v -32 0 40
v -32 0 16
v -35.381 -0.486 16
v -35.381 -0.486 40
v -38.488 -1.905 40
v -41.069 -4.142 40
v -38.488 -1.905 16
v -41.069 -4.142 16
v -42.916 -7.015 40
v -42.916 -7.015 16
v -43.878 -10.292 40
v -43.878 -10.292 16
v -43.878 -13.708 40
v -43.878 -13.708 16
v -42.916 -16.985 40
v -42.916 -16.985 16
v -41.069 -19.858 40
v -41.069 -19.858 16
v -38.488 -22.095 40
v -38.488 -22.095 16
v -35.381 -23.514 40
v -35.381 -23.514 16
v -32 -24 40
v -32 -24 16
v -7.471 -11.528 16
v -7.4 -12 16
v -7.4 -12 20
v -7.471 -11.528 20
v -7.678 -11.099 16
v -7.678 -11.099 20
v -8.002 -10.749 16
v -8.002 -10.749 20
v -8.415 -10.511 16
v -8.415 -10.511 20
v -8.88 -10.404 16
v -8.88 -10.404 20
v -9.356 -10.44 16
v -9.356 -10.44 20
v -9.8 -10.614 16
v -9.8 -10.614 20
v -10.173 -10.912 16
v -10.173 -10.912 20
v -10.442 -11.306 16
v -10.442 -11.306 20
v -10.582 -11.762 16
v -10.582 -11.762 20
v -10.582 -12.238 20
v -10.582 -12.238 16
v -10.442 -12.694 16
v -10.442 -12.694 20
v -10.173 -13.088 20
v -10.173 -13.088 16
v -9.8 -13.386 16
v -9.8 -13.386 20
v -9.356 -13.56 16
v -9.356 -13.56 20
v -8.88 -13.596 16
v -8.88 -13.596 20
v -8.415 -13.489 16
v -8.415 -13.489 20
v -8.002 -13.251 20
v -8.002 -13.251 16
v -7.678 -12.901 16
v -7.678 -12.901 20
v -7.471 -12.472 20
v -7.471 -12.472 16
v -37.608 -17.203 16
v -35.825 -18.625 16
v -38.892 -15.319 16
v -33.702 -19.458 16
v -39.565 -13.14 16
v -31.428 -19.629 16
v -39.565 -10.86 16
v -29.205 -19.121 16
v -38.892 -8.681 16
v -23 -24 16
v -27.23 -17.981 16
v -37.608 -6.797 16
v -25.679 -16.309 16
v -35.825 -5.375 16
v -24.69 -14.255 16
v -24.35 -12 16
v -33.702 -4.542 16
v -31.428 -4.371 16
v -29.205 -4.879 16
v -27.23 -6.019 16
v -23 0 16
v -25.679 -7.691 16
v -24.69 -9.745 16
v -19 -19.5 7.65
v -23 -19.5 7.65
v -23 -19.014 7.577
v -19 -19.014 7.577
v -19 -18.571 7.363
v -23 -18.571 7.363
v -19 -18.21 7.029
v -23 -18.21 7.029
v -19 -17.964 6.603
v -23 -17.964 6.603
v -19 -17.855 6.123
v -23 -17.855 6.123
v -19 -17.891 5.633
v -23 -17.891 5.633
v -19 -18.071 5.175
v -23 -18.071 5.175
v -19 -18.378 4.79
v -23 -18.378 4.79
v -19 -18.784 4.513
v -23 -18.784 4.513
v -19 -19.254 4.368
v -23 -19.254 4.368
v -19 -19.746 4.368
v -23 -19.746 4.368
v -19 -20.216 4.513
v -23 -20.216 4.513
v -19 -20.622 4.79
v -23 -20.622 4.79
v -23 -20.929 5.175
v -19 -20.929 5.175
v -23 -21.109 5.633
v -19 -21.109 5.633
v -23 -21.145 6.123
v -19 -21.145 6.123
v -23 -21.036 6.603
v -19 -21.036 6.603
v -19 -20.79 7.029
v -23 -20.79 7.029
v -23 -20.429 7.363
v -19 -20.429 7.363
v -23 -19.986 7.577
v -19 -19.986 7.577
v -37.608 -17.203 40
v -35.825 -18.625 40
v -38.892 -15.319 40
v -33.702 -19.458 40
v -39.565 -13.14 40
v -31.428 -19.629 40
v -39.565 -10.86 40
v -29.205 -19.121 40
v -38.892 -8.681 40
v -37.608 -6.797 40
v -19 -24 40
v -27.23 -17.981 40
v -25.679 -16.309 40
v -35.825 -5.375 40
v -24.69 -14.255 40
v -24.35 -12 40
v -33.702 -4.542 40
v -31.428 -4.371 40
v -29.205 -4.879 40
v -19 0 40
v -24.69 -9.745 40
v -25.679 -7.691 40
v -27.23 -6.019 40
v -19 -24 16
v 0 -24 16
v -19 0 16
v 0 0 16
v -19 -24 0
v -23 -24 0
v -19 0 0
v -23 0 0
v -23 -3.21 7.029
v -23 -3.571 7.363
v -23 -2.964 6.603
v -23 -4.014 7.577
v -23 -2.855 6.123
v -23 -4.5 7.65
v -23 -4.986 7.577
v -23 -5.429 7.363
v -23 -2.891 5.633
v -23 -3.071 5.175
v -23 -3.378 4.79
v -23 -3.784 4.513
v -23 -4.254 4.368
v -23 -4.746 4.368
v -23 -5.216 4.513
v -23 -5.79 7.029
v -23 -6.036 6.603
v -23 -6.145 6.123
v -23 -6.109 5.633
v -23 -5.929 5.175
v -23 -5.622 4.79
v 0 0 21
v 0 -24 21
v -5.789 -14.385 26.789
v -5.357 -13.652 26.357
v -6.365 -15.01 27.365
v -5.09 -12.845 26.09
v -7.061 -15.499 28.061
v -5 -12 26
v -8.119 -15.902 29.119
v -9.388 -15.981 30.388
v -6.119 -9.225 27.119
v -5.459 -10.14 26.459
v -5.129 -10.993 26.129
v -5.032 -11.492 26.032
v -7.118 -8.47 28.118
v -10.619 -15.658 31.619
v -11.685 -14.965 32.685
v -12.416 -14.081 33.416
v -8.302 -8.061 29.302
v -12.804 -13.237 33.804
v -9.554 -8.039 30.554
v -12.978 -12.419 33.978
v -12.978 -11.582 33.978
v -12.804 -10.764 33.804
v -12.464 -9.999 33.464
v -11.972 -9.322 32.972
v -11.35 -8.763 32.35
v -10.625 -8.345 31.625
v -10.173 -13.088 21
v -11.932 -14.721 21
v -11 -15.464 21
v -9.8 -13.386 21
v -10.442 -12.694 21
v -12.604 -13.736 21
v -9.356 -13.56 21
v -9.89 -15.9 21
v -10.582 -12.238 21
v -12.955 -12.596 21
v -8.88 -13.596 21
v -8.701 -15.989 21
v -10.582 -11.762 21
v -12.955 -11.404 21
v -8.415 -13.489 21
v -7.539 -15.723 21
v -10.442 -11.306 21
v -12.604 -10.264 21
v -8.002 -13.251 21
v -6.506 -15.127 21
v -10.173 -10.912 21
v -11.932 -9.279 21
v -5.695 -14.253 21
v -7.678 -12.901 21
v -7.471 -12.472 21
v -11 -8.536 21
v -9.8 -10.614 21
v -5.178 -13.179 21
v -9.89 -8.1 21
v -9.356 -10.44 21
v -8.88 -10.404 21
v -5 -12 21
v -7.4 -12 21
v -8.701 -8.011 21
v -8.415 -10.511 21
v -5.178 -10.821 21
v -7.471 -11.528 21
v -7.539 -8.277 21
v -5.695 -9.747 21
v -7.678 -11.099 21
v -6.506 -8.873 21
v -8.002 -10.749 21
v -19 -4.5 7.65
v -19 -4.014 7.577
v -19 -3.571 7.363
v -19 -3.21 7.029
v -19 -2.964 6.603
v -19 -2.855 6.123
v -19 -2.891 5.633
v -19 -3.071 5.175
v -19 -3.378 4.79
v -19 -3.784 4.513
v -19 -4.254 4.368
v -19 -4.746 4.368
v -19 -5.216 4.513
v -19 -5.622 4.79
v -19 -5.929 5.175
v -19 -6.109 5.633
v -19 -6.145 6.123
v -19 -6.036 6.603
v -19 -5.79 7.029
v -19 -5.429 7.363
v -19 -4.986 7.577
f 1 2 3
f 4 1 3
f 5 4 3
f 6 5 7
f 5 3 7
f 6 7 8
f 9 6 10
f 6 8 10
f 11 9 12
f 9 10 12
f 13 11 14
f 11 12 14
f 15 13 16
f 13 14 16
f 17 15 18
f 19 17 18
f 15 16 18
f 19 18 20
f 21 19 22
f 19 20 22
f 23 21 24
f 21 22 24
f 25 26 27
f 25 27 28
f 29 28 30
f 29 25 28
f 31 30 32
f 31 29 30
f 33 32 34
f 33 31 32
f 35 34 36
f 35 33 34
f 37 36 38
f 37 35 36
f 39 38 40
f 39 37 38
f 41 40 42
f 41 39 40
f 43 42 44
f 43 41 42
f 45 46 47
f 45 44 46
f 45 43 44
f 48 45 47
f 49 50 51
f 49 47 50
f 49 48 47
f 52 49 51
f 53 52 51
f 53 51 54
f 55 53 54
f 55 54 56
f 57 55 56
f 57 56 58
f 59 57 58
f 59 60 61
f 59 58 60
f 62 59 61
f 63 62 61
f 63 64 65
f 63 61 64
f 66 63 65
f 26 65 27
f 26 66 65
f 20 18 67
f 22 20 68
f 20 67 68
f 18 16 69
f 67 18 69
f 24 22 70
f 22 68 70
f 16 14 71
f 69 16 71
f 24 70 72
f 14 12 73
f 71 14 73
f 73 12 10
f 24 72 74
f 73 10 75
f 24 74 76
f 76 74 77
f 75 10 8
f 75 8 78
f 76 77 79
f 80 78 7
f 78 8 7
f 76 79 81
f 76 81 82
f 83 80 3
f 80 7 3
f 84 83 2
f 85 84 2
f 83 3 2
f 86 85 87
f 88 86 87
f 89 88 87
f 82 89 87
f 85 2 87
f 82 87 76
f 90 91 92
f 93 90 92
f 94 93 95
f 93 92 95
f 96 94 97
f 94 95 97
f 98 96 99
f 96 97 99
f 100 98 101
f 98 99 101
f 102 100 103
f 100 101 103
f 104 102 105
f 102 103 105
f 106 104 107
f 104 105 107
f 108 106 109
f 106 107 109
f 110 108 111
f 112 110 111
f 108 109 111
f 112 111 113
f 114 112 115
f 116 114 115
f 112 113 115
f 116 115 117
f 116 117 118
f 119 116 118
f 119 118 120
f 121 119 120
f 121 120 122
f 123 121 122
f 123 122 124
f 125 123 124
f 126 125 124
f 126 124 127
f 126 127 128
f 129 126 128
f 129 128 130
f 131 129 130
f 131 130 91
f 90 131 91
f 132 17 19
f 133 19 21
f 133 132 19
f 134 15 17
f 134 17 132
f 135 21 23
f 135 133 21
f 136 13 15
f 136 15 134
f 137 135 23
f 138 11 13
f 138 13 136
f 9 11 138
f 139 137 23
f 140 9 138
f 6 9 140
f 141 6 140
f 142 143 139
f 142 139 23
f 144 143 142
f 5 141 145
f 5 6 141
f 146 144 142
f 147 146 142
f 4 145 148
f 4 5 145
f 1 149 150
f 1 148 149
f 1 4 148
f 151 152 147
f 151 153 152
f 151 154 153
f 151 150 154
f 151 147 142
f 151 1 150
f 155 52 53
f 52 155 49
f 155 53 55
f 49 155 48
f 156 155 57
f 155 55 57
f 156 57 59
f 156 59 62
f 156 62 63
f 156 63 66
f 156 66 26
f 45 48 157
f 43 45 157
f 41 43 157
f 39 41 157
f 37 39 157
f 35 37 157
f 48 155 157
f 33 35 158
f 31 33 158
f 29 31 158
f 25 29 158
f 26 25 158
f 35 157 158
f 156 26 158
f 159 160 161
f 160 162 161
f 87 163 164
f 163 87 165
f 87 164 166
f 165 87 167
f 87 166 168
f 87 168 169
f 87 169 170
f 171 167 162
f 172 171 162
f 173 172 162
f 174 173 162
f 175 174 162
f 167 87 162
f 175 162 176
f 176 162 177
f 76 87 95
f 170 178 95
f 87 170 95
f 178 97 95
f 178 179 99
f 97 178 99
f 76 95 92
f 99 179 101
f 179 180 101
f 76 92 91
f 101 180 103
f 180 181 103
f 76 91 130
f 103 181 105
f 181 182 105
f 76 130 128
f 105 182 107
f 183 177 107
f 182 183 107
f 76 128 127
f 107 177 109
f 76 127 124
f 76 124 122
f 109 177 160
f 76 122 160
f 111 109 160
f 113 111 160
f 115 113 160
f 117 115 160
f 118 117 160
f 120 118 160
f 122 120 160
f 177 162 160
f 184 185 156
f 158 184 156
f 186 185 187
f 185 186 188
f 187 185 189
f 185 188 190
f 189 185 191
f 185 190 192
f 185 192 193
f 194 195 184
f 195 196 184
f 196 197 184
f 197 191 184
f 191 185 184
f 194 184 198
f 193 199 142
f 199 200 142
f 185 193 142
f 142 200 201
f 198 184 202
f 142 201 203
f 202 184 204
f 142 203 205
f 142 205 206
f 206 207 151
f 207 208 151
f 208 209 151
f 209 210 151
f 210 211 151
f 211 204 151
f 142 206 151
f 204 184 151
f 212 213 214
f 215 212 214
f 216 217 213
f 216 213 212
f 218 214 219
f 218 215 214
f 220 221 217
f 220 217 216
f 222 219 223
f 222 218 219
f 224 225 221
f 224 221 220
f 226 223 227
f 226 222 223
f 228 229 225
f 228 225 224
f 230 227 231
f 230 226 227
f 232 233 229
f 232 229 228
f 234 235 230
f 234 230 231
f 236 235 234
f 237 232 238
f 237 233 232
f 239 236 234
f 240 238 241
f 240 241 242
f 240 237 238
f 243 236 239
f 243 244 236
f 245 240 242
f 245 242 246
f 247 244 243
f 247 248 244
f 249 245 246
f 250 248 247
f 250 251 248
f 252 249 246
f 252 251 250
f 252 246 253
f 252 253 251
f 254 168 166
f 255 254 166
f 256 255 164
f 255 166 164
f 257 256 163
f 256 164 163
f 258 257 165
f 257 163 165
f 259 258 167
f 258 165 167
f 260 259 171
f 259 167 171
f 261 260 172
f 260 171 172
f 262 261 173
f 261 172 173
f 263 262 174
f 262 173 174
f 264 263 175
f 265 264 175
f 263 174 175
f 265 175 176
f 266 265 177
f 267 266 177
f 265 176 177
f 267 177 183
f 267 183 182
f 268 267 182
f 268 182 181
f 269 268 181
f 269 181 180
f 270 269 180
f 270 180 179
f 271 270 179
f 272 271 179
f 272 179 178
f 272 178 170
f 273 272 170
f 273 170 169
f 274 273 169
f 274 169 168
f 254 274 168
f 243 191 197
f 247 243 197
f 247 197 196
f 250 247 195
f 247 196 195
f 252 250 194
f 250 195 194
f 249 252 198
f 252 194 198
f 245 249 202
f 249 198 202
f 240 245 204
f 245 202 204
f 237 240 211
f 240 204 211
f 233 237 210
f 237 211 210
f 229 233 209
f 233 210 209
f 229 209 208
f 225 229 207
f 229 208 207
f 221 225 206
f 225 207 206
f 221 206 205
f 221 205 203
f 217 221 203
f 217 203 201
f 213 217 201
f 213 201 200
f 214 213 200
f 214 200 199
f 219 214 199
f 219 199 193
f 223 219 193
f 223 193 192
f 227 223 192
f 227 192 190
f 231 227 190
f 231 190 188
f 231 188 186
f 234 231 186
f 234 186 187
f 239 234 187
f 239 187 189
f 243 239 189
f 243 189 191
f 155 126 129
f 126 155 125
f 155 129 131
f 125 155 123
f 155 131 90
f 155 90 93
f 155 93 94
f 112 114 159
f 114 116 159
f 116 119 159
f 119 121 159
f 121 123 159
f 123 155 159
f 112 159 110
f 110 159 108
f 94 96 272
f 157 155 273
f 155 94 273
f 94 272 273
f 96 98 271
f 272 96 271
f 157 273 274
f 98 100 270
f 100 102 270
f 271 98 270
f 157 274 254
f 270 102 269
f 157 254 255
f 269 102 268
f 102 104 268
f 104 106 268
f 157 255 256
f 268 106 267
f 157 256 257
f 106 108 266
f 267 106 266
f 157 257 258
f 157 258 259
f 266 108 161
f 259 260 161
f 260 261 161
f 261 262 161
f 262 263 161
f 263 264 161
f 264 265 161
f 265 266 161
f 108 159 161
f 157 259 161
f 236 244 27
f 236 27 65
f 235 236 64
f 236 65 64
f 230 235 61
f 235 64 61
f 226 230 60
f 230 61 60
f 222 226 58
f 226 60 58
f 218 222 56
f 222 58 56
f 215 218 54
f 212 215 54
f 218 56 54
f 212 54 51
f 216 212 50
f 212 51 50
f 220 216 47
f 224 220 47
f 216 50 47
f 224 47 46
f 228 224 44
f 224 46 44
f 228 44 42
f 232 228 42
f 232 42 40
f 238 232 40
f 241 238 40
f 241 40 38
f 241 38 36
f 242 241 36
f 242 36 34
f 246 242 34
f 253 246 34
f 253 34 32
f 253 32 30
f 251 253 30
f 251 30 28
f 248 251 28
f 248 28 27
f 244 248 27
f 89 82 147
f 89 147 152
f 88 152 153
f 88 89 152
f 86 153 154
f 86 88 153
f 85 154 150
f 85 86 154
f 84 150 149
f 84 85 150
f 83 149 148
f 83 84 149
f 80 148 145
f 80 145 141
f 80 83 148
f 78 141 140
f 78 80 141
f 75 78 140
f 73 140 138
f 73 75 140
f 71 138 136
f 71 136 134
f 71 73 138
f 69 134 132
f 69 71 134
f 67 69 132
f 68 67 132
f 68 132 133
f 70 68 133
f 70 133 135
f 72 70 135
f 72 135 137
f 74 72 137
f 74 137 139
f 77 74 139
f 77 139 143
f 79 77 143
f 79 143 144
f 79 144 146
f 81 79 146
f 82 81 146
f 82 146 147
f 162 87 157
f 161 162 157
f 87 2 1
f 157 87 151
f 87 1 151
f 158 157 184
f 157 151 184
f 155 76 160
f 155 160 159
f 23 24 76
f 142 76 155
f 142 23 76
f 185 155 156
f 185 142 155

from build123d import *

# Parameters (mm, degrees)
ESBO_O1_R                = 7.65
ESBO_O1_R_2              = 1.6
RESSALTO_EXTRUS_O1_DEPTH = 40
ESBO_O2_W                = 19
ESBO_O2_H                = 20
ESBO_O2_W_2              = 21
ESBO_O2_H_2              = 16
CORTE_EXTRUS_O1_DEPTH    = 67.603303221
ESBO_O3_R                = 1.65
ESBO_O3_W                = 40
ESBO_O3_H                = 6
CORTE_EXTRUS_O2_DEPTH    = 20
CHANFRO2_SIZE            = 20
ESBO_O4_R                = 4
CORTE_EXTRUS_O3_DEPTH    = 19


with BuildPart() as part:
    # Esboço1 → Ressalto-extrusão1 (new body)
    with BuildSketch(Plane.XY):
        with BuildLine():
            Line((0, 0), (-19, 0))
            Line((-19, 0), (-19, 6))
            Line((-19, 6), (-23, 6))
            Line((-23, 6), (-23, 0))
            Line((-23, 0), (-32, 0))
            ThreePointArc((-32, 0), (-44, -12), (-32, -24))
            Line((-32, -24), (-23, -24))
            Line((-23, -24), (-23, -30))
            Line((-23, -30), (-19, -30))
            Line((-19, -30), (-19, -24))
            Line((-19, -24), (0, -24))
            Line((0, -24), (0, 0))
        make_face()
        with Locations((-32, -12)):
            Circle(ESBO_O1_R, mode=Mode.SUBTRACT)
        with Locations((-9, -12)):
            Circle(ESBO_O1_R_2, mode=Mode.SUBTRACT)
    extrude(amount=RESSALTO_EXTRUS_O1_DEPTH)

    # Esboço2 → Corte-extrusão1 (cut, through all)
    with BuildSketch(Plane(origin=(0, 0, 0), x_dir=(1, 0, 0), z_dir=(0, 1, 0))):
        with Locations((-9.5, -30)):
            Rectangle(ESBO_O2_W, ESBO_O2_H)
        with Locations((-33.5, -8)):
            Rectangle(ESBO_O2_W_2, ESBO_O2_H_2)
        with Locations((-9.5, -8)):
            Rectangle(ESBO_O2_W, ESBO_O2_H_2)
    extrude(amount=-CORTE_EXTRUS_O1_DEPTH, mode=Mode.SUBTRACT)

    # Esboço3 → Corte-extrusão2 (cut)
    with BuildSketch(Plane.ZY.offset(23)):
        with Locations((6, -4.5)):
            Circle(ESBO_O3_R)
        with Locations((6, -19.5)):
            Circle(ESBO_O3_R)
        with Locations((20, 3)):
            Rectangle(ESBO_O3_W, ESBO_O3_H)
        with Locations((20, -27)):
            Rectangle(ESBO_O3_W, ESBO_O3_H)
    extrude(amount=-CORTE_EXTRUS_O2_DEPTH, mode=Mode.SUBTRACT)

    # Chanfro2
    # the kernel refuses this chamfer: 20 mm, written as the material it adds along each edge
    with BuildSketch(Plane(origin=(-19, 0, 20), x_dir=(0.9996219169112968, 0, -0.02749587661058649), z_dir=(0, -1, 0))) as chanfro2_piece_1_section:
        Polygon((CHANFRO2_SIZE * 0.999621916911, CHANFRO2_SIZE * 0.0274958766106), (-CHANFRO2_SIZE * 0.0274958766106, CHANFRO2_SIZE * 0.999621916911), (0, 0), align=None)
    chanfro2_piece_1 = extrude(amount=24, mode=Mode.PRIVATE)
    chanfro2_piece_1 = chanfro2_piece_1 - Plane(origin=(-9, -12, 26.656748397), x_dir=(1, 0, 0), z_dir=(0, 0, -1)) * Cylinder(1.6, 128, mode=Mode.PRIVATE)
    chanfro2_piece_1 = split(chanfro2_piece_1, bisect_by=Plane(origin=(0, -11.999999472, 26.656748397), z_dir=(-1, 0, 0)), keep=Keep.TOP, mode=Mode.PRIVATE)
    chanfro2_piece_1 = split(chanfro2_piece_1, bisect_by=Plane(origin=(-12.552402044, -11.999999472, 40), z_dir=(0, 0, -1)), keep=Keep.TOP, mode=Mode.PRIVATE)
    add(chanfro2_piece_1)

    # Esboço4 → Corte-extrusão3 (cut)
    with BuildSketch(Plane.XY.offset(40)):
        with Locations((-9, -12)):
            Circle(ESBO_O4_R)
    extrude(amount=-CORTE_EXTRUS_O3_DEPTH, mode=Mode.SUBTRACT)


solid = part.part
